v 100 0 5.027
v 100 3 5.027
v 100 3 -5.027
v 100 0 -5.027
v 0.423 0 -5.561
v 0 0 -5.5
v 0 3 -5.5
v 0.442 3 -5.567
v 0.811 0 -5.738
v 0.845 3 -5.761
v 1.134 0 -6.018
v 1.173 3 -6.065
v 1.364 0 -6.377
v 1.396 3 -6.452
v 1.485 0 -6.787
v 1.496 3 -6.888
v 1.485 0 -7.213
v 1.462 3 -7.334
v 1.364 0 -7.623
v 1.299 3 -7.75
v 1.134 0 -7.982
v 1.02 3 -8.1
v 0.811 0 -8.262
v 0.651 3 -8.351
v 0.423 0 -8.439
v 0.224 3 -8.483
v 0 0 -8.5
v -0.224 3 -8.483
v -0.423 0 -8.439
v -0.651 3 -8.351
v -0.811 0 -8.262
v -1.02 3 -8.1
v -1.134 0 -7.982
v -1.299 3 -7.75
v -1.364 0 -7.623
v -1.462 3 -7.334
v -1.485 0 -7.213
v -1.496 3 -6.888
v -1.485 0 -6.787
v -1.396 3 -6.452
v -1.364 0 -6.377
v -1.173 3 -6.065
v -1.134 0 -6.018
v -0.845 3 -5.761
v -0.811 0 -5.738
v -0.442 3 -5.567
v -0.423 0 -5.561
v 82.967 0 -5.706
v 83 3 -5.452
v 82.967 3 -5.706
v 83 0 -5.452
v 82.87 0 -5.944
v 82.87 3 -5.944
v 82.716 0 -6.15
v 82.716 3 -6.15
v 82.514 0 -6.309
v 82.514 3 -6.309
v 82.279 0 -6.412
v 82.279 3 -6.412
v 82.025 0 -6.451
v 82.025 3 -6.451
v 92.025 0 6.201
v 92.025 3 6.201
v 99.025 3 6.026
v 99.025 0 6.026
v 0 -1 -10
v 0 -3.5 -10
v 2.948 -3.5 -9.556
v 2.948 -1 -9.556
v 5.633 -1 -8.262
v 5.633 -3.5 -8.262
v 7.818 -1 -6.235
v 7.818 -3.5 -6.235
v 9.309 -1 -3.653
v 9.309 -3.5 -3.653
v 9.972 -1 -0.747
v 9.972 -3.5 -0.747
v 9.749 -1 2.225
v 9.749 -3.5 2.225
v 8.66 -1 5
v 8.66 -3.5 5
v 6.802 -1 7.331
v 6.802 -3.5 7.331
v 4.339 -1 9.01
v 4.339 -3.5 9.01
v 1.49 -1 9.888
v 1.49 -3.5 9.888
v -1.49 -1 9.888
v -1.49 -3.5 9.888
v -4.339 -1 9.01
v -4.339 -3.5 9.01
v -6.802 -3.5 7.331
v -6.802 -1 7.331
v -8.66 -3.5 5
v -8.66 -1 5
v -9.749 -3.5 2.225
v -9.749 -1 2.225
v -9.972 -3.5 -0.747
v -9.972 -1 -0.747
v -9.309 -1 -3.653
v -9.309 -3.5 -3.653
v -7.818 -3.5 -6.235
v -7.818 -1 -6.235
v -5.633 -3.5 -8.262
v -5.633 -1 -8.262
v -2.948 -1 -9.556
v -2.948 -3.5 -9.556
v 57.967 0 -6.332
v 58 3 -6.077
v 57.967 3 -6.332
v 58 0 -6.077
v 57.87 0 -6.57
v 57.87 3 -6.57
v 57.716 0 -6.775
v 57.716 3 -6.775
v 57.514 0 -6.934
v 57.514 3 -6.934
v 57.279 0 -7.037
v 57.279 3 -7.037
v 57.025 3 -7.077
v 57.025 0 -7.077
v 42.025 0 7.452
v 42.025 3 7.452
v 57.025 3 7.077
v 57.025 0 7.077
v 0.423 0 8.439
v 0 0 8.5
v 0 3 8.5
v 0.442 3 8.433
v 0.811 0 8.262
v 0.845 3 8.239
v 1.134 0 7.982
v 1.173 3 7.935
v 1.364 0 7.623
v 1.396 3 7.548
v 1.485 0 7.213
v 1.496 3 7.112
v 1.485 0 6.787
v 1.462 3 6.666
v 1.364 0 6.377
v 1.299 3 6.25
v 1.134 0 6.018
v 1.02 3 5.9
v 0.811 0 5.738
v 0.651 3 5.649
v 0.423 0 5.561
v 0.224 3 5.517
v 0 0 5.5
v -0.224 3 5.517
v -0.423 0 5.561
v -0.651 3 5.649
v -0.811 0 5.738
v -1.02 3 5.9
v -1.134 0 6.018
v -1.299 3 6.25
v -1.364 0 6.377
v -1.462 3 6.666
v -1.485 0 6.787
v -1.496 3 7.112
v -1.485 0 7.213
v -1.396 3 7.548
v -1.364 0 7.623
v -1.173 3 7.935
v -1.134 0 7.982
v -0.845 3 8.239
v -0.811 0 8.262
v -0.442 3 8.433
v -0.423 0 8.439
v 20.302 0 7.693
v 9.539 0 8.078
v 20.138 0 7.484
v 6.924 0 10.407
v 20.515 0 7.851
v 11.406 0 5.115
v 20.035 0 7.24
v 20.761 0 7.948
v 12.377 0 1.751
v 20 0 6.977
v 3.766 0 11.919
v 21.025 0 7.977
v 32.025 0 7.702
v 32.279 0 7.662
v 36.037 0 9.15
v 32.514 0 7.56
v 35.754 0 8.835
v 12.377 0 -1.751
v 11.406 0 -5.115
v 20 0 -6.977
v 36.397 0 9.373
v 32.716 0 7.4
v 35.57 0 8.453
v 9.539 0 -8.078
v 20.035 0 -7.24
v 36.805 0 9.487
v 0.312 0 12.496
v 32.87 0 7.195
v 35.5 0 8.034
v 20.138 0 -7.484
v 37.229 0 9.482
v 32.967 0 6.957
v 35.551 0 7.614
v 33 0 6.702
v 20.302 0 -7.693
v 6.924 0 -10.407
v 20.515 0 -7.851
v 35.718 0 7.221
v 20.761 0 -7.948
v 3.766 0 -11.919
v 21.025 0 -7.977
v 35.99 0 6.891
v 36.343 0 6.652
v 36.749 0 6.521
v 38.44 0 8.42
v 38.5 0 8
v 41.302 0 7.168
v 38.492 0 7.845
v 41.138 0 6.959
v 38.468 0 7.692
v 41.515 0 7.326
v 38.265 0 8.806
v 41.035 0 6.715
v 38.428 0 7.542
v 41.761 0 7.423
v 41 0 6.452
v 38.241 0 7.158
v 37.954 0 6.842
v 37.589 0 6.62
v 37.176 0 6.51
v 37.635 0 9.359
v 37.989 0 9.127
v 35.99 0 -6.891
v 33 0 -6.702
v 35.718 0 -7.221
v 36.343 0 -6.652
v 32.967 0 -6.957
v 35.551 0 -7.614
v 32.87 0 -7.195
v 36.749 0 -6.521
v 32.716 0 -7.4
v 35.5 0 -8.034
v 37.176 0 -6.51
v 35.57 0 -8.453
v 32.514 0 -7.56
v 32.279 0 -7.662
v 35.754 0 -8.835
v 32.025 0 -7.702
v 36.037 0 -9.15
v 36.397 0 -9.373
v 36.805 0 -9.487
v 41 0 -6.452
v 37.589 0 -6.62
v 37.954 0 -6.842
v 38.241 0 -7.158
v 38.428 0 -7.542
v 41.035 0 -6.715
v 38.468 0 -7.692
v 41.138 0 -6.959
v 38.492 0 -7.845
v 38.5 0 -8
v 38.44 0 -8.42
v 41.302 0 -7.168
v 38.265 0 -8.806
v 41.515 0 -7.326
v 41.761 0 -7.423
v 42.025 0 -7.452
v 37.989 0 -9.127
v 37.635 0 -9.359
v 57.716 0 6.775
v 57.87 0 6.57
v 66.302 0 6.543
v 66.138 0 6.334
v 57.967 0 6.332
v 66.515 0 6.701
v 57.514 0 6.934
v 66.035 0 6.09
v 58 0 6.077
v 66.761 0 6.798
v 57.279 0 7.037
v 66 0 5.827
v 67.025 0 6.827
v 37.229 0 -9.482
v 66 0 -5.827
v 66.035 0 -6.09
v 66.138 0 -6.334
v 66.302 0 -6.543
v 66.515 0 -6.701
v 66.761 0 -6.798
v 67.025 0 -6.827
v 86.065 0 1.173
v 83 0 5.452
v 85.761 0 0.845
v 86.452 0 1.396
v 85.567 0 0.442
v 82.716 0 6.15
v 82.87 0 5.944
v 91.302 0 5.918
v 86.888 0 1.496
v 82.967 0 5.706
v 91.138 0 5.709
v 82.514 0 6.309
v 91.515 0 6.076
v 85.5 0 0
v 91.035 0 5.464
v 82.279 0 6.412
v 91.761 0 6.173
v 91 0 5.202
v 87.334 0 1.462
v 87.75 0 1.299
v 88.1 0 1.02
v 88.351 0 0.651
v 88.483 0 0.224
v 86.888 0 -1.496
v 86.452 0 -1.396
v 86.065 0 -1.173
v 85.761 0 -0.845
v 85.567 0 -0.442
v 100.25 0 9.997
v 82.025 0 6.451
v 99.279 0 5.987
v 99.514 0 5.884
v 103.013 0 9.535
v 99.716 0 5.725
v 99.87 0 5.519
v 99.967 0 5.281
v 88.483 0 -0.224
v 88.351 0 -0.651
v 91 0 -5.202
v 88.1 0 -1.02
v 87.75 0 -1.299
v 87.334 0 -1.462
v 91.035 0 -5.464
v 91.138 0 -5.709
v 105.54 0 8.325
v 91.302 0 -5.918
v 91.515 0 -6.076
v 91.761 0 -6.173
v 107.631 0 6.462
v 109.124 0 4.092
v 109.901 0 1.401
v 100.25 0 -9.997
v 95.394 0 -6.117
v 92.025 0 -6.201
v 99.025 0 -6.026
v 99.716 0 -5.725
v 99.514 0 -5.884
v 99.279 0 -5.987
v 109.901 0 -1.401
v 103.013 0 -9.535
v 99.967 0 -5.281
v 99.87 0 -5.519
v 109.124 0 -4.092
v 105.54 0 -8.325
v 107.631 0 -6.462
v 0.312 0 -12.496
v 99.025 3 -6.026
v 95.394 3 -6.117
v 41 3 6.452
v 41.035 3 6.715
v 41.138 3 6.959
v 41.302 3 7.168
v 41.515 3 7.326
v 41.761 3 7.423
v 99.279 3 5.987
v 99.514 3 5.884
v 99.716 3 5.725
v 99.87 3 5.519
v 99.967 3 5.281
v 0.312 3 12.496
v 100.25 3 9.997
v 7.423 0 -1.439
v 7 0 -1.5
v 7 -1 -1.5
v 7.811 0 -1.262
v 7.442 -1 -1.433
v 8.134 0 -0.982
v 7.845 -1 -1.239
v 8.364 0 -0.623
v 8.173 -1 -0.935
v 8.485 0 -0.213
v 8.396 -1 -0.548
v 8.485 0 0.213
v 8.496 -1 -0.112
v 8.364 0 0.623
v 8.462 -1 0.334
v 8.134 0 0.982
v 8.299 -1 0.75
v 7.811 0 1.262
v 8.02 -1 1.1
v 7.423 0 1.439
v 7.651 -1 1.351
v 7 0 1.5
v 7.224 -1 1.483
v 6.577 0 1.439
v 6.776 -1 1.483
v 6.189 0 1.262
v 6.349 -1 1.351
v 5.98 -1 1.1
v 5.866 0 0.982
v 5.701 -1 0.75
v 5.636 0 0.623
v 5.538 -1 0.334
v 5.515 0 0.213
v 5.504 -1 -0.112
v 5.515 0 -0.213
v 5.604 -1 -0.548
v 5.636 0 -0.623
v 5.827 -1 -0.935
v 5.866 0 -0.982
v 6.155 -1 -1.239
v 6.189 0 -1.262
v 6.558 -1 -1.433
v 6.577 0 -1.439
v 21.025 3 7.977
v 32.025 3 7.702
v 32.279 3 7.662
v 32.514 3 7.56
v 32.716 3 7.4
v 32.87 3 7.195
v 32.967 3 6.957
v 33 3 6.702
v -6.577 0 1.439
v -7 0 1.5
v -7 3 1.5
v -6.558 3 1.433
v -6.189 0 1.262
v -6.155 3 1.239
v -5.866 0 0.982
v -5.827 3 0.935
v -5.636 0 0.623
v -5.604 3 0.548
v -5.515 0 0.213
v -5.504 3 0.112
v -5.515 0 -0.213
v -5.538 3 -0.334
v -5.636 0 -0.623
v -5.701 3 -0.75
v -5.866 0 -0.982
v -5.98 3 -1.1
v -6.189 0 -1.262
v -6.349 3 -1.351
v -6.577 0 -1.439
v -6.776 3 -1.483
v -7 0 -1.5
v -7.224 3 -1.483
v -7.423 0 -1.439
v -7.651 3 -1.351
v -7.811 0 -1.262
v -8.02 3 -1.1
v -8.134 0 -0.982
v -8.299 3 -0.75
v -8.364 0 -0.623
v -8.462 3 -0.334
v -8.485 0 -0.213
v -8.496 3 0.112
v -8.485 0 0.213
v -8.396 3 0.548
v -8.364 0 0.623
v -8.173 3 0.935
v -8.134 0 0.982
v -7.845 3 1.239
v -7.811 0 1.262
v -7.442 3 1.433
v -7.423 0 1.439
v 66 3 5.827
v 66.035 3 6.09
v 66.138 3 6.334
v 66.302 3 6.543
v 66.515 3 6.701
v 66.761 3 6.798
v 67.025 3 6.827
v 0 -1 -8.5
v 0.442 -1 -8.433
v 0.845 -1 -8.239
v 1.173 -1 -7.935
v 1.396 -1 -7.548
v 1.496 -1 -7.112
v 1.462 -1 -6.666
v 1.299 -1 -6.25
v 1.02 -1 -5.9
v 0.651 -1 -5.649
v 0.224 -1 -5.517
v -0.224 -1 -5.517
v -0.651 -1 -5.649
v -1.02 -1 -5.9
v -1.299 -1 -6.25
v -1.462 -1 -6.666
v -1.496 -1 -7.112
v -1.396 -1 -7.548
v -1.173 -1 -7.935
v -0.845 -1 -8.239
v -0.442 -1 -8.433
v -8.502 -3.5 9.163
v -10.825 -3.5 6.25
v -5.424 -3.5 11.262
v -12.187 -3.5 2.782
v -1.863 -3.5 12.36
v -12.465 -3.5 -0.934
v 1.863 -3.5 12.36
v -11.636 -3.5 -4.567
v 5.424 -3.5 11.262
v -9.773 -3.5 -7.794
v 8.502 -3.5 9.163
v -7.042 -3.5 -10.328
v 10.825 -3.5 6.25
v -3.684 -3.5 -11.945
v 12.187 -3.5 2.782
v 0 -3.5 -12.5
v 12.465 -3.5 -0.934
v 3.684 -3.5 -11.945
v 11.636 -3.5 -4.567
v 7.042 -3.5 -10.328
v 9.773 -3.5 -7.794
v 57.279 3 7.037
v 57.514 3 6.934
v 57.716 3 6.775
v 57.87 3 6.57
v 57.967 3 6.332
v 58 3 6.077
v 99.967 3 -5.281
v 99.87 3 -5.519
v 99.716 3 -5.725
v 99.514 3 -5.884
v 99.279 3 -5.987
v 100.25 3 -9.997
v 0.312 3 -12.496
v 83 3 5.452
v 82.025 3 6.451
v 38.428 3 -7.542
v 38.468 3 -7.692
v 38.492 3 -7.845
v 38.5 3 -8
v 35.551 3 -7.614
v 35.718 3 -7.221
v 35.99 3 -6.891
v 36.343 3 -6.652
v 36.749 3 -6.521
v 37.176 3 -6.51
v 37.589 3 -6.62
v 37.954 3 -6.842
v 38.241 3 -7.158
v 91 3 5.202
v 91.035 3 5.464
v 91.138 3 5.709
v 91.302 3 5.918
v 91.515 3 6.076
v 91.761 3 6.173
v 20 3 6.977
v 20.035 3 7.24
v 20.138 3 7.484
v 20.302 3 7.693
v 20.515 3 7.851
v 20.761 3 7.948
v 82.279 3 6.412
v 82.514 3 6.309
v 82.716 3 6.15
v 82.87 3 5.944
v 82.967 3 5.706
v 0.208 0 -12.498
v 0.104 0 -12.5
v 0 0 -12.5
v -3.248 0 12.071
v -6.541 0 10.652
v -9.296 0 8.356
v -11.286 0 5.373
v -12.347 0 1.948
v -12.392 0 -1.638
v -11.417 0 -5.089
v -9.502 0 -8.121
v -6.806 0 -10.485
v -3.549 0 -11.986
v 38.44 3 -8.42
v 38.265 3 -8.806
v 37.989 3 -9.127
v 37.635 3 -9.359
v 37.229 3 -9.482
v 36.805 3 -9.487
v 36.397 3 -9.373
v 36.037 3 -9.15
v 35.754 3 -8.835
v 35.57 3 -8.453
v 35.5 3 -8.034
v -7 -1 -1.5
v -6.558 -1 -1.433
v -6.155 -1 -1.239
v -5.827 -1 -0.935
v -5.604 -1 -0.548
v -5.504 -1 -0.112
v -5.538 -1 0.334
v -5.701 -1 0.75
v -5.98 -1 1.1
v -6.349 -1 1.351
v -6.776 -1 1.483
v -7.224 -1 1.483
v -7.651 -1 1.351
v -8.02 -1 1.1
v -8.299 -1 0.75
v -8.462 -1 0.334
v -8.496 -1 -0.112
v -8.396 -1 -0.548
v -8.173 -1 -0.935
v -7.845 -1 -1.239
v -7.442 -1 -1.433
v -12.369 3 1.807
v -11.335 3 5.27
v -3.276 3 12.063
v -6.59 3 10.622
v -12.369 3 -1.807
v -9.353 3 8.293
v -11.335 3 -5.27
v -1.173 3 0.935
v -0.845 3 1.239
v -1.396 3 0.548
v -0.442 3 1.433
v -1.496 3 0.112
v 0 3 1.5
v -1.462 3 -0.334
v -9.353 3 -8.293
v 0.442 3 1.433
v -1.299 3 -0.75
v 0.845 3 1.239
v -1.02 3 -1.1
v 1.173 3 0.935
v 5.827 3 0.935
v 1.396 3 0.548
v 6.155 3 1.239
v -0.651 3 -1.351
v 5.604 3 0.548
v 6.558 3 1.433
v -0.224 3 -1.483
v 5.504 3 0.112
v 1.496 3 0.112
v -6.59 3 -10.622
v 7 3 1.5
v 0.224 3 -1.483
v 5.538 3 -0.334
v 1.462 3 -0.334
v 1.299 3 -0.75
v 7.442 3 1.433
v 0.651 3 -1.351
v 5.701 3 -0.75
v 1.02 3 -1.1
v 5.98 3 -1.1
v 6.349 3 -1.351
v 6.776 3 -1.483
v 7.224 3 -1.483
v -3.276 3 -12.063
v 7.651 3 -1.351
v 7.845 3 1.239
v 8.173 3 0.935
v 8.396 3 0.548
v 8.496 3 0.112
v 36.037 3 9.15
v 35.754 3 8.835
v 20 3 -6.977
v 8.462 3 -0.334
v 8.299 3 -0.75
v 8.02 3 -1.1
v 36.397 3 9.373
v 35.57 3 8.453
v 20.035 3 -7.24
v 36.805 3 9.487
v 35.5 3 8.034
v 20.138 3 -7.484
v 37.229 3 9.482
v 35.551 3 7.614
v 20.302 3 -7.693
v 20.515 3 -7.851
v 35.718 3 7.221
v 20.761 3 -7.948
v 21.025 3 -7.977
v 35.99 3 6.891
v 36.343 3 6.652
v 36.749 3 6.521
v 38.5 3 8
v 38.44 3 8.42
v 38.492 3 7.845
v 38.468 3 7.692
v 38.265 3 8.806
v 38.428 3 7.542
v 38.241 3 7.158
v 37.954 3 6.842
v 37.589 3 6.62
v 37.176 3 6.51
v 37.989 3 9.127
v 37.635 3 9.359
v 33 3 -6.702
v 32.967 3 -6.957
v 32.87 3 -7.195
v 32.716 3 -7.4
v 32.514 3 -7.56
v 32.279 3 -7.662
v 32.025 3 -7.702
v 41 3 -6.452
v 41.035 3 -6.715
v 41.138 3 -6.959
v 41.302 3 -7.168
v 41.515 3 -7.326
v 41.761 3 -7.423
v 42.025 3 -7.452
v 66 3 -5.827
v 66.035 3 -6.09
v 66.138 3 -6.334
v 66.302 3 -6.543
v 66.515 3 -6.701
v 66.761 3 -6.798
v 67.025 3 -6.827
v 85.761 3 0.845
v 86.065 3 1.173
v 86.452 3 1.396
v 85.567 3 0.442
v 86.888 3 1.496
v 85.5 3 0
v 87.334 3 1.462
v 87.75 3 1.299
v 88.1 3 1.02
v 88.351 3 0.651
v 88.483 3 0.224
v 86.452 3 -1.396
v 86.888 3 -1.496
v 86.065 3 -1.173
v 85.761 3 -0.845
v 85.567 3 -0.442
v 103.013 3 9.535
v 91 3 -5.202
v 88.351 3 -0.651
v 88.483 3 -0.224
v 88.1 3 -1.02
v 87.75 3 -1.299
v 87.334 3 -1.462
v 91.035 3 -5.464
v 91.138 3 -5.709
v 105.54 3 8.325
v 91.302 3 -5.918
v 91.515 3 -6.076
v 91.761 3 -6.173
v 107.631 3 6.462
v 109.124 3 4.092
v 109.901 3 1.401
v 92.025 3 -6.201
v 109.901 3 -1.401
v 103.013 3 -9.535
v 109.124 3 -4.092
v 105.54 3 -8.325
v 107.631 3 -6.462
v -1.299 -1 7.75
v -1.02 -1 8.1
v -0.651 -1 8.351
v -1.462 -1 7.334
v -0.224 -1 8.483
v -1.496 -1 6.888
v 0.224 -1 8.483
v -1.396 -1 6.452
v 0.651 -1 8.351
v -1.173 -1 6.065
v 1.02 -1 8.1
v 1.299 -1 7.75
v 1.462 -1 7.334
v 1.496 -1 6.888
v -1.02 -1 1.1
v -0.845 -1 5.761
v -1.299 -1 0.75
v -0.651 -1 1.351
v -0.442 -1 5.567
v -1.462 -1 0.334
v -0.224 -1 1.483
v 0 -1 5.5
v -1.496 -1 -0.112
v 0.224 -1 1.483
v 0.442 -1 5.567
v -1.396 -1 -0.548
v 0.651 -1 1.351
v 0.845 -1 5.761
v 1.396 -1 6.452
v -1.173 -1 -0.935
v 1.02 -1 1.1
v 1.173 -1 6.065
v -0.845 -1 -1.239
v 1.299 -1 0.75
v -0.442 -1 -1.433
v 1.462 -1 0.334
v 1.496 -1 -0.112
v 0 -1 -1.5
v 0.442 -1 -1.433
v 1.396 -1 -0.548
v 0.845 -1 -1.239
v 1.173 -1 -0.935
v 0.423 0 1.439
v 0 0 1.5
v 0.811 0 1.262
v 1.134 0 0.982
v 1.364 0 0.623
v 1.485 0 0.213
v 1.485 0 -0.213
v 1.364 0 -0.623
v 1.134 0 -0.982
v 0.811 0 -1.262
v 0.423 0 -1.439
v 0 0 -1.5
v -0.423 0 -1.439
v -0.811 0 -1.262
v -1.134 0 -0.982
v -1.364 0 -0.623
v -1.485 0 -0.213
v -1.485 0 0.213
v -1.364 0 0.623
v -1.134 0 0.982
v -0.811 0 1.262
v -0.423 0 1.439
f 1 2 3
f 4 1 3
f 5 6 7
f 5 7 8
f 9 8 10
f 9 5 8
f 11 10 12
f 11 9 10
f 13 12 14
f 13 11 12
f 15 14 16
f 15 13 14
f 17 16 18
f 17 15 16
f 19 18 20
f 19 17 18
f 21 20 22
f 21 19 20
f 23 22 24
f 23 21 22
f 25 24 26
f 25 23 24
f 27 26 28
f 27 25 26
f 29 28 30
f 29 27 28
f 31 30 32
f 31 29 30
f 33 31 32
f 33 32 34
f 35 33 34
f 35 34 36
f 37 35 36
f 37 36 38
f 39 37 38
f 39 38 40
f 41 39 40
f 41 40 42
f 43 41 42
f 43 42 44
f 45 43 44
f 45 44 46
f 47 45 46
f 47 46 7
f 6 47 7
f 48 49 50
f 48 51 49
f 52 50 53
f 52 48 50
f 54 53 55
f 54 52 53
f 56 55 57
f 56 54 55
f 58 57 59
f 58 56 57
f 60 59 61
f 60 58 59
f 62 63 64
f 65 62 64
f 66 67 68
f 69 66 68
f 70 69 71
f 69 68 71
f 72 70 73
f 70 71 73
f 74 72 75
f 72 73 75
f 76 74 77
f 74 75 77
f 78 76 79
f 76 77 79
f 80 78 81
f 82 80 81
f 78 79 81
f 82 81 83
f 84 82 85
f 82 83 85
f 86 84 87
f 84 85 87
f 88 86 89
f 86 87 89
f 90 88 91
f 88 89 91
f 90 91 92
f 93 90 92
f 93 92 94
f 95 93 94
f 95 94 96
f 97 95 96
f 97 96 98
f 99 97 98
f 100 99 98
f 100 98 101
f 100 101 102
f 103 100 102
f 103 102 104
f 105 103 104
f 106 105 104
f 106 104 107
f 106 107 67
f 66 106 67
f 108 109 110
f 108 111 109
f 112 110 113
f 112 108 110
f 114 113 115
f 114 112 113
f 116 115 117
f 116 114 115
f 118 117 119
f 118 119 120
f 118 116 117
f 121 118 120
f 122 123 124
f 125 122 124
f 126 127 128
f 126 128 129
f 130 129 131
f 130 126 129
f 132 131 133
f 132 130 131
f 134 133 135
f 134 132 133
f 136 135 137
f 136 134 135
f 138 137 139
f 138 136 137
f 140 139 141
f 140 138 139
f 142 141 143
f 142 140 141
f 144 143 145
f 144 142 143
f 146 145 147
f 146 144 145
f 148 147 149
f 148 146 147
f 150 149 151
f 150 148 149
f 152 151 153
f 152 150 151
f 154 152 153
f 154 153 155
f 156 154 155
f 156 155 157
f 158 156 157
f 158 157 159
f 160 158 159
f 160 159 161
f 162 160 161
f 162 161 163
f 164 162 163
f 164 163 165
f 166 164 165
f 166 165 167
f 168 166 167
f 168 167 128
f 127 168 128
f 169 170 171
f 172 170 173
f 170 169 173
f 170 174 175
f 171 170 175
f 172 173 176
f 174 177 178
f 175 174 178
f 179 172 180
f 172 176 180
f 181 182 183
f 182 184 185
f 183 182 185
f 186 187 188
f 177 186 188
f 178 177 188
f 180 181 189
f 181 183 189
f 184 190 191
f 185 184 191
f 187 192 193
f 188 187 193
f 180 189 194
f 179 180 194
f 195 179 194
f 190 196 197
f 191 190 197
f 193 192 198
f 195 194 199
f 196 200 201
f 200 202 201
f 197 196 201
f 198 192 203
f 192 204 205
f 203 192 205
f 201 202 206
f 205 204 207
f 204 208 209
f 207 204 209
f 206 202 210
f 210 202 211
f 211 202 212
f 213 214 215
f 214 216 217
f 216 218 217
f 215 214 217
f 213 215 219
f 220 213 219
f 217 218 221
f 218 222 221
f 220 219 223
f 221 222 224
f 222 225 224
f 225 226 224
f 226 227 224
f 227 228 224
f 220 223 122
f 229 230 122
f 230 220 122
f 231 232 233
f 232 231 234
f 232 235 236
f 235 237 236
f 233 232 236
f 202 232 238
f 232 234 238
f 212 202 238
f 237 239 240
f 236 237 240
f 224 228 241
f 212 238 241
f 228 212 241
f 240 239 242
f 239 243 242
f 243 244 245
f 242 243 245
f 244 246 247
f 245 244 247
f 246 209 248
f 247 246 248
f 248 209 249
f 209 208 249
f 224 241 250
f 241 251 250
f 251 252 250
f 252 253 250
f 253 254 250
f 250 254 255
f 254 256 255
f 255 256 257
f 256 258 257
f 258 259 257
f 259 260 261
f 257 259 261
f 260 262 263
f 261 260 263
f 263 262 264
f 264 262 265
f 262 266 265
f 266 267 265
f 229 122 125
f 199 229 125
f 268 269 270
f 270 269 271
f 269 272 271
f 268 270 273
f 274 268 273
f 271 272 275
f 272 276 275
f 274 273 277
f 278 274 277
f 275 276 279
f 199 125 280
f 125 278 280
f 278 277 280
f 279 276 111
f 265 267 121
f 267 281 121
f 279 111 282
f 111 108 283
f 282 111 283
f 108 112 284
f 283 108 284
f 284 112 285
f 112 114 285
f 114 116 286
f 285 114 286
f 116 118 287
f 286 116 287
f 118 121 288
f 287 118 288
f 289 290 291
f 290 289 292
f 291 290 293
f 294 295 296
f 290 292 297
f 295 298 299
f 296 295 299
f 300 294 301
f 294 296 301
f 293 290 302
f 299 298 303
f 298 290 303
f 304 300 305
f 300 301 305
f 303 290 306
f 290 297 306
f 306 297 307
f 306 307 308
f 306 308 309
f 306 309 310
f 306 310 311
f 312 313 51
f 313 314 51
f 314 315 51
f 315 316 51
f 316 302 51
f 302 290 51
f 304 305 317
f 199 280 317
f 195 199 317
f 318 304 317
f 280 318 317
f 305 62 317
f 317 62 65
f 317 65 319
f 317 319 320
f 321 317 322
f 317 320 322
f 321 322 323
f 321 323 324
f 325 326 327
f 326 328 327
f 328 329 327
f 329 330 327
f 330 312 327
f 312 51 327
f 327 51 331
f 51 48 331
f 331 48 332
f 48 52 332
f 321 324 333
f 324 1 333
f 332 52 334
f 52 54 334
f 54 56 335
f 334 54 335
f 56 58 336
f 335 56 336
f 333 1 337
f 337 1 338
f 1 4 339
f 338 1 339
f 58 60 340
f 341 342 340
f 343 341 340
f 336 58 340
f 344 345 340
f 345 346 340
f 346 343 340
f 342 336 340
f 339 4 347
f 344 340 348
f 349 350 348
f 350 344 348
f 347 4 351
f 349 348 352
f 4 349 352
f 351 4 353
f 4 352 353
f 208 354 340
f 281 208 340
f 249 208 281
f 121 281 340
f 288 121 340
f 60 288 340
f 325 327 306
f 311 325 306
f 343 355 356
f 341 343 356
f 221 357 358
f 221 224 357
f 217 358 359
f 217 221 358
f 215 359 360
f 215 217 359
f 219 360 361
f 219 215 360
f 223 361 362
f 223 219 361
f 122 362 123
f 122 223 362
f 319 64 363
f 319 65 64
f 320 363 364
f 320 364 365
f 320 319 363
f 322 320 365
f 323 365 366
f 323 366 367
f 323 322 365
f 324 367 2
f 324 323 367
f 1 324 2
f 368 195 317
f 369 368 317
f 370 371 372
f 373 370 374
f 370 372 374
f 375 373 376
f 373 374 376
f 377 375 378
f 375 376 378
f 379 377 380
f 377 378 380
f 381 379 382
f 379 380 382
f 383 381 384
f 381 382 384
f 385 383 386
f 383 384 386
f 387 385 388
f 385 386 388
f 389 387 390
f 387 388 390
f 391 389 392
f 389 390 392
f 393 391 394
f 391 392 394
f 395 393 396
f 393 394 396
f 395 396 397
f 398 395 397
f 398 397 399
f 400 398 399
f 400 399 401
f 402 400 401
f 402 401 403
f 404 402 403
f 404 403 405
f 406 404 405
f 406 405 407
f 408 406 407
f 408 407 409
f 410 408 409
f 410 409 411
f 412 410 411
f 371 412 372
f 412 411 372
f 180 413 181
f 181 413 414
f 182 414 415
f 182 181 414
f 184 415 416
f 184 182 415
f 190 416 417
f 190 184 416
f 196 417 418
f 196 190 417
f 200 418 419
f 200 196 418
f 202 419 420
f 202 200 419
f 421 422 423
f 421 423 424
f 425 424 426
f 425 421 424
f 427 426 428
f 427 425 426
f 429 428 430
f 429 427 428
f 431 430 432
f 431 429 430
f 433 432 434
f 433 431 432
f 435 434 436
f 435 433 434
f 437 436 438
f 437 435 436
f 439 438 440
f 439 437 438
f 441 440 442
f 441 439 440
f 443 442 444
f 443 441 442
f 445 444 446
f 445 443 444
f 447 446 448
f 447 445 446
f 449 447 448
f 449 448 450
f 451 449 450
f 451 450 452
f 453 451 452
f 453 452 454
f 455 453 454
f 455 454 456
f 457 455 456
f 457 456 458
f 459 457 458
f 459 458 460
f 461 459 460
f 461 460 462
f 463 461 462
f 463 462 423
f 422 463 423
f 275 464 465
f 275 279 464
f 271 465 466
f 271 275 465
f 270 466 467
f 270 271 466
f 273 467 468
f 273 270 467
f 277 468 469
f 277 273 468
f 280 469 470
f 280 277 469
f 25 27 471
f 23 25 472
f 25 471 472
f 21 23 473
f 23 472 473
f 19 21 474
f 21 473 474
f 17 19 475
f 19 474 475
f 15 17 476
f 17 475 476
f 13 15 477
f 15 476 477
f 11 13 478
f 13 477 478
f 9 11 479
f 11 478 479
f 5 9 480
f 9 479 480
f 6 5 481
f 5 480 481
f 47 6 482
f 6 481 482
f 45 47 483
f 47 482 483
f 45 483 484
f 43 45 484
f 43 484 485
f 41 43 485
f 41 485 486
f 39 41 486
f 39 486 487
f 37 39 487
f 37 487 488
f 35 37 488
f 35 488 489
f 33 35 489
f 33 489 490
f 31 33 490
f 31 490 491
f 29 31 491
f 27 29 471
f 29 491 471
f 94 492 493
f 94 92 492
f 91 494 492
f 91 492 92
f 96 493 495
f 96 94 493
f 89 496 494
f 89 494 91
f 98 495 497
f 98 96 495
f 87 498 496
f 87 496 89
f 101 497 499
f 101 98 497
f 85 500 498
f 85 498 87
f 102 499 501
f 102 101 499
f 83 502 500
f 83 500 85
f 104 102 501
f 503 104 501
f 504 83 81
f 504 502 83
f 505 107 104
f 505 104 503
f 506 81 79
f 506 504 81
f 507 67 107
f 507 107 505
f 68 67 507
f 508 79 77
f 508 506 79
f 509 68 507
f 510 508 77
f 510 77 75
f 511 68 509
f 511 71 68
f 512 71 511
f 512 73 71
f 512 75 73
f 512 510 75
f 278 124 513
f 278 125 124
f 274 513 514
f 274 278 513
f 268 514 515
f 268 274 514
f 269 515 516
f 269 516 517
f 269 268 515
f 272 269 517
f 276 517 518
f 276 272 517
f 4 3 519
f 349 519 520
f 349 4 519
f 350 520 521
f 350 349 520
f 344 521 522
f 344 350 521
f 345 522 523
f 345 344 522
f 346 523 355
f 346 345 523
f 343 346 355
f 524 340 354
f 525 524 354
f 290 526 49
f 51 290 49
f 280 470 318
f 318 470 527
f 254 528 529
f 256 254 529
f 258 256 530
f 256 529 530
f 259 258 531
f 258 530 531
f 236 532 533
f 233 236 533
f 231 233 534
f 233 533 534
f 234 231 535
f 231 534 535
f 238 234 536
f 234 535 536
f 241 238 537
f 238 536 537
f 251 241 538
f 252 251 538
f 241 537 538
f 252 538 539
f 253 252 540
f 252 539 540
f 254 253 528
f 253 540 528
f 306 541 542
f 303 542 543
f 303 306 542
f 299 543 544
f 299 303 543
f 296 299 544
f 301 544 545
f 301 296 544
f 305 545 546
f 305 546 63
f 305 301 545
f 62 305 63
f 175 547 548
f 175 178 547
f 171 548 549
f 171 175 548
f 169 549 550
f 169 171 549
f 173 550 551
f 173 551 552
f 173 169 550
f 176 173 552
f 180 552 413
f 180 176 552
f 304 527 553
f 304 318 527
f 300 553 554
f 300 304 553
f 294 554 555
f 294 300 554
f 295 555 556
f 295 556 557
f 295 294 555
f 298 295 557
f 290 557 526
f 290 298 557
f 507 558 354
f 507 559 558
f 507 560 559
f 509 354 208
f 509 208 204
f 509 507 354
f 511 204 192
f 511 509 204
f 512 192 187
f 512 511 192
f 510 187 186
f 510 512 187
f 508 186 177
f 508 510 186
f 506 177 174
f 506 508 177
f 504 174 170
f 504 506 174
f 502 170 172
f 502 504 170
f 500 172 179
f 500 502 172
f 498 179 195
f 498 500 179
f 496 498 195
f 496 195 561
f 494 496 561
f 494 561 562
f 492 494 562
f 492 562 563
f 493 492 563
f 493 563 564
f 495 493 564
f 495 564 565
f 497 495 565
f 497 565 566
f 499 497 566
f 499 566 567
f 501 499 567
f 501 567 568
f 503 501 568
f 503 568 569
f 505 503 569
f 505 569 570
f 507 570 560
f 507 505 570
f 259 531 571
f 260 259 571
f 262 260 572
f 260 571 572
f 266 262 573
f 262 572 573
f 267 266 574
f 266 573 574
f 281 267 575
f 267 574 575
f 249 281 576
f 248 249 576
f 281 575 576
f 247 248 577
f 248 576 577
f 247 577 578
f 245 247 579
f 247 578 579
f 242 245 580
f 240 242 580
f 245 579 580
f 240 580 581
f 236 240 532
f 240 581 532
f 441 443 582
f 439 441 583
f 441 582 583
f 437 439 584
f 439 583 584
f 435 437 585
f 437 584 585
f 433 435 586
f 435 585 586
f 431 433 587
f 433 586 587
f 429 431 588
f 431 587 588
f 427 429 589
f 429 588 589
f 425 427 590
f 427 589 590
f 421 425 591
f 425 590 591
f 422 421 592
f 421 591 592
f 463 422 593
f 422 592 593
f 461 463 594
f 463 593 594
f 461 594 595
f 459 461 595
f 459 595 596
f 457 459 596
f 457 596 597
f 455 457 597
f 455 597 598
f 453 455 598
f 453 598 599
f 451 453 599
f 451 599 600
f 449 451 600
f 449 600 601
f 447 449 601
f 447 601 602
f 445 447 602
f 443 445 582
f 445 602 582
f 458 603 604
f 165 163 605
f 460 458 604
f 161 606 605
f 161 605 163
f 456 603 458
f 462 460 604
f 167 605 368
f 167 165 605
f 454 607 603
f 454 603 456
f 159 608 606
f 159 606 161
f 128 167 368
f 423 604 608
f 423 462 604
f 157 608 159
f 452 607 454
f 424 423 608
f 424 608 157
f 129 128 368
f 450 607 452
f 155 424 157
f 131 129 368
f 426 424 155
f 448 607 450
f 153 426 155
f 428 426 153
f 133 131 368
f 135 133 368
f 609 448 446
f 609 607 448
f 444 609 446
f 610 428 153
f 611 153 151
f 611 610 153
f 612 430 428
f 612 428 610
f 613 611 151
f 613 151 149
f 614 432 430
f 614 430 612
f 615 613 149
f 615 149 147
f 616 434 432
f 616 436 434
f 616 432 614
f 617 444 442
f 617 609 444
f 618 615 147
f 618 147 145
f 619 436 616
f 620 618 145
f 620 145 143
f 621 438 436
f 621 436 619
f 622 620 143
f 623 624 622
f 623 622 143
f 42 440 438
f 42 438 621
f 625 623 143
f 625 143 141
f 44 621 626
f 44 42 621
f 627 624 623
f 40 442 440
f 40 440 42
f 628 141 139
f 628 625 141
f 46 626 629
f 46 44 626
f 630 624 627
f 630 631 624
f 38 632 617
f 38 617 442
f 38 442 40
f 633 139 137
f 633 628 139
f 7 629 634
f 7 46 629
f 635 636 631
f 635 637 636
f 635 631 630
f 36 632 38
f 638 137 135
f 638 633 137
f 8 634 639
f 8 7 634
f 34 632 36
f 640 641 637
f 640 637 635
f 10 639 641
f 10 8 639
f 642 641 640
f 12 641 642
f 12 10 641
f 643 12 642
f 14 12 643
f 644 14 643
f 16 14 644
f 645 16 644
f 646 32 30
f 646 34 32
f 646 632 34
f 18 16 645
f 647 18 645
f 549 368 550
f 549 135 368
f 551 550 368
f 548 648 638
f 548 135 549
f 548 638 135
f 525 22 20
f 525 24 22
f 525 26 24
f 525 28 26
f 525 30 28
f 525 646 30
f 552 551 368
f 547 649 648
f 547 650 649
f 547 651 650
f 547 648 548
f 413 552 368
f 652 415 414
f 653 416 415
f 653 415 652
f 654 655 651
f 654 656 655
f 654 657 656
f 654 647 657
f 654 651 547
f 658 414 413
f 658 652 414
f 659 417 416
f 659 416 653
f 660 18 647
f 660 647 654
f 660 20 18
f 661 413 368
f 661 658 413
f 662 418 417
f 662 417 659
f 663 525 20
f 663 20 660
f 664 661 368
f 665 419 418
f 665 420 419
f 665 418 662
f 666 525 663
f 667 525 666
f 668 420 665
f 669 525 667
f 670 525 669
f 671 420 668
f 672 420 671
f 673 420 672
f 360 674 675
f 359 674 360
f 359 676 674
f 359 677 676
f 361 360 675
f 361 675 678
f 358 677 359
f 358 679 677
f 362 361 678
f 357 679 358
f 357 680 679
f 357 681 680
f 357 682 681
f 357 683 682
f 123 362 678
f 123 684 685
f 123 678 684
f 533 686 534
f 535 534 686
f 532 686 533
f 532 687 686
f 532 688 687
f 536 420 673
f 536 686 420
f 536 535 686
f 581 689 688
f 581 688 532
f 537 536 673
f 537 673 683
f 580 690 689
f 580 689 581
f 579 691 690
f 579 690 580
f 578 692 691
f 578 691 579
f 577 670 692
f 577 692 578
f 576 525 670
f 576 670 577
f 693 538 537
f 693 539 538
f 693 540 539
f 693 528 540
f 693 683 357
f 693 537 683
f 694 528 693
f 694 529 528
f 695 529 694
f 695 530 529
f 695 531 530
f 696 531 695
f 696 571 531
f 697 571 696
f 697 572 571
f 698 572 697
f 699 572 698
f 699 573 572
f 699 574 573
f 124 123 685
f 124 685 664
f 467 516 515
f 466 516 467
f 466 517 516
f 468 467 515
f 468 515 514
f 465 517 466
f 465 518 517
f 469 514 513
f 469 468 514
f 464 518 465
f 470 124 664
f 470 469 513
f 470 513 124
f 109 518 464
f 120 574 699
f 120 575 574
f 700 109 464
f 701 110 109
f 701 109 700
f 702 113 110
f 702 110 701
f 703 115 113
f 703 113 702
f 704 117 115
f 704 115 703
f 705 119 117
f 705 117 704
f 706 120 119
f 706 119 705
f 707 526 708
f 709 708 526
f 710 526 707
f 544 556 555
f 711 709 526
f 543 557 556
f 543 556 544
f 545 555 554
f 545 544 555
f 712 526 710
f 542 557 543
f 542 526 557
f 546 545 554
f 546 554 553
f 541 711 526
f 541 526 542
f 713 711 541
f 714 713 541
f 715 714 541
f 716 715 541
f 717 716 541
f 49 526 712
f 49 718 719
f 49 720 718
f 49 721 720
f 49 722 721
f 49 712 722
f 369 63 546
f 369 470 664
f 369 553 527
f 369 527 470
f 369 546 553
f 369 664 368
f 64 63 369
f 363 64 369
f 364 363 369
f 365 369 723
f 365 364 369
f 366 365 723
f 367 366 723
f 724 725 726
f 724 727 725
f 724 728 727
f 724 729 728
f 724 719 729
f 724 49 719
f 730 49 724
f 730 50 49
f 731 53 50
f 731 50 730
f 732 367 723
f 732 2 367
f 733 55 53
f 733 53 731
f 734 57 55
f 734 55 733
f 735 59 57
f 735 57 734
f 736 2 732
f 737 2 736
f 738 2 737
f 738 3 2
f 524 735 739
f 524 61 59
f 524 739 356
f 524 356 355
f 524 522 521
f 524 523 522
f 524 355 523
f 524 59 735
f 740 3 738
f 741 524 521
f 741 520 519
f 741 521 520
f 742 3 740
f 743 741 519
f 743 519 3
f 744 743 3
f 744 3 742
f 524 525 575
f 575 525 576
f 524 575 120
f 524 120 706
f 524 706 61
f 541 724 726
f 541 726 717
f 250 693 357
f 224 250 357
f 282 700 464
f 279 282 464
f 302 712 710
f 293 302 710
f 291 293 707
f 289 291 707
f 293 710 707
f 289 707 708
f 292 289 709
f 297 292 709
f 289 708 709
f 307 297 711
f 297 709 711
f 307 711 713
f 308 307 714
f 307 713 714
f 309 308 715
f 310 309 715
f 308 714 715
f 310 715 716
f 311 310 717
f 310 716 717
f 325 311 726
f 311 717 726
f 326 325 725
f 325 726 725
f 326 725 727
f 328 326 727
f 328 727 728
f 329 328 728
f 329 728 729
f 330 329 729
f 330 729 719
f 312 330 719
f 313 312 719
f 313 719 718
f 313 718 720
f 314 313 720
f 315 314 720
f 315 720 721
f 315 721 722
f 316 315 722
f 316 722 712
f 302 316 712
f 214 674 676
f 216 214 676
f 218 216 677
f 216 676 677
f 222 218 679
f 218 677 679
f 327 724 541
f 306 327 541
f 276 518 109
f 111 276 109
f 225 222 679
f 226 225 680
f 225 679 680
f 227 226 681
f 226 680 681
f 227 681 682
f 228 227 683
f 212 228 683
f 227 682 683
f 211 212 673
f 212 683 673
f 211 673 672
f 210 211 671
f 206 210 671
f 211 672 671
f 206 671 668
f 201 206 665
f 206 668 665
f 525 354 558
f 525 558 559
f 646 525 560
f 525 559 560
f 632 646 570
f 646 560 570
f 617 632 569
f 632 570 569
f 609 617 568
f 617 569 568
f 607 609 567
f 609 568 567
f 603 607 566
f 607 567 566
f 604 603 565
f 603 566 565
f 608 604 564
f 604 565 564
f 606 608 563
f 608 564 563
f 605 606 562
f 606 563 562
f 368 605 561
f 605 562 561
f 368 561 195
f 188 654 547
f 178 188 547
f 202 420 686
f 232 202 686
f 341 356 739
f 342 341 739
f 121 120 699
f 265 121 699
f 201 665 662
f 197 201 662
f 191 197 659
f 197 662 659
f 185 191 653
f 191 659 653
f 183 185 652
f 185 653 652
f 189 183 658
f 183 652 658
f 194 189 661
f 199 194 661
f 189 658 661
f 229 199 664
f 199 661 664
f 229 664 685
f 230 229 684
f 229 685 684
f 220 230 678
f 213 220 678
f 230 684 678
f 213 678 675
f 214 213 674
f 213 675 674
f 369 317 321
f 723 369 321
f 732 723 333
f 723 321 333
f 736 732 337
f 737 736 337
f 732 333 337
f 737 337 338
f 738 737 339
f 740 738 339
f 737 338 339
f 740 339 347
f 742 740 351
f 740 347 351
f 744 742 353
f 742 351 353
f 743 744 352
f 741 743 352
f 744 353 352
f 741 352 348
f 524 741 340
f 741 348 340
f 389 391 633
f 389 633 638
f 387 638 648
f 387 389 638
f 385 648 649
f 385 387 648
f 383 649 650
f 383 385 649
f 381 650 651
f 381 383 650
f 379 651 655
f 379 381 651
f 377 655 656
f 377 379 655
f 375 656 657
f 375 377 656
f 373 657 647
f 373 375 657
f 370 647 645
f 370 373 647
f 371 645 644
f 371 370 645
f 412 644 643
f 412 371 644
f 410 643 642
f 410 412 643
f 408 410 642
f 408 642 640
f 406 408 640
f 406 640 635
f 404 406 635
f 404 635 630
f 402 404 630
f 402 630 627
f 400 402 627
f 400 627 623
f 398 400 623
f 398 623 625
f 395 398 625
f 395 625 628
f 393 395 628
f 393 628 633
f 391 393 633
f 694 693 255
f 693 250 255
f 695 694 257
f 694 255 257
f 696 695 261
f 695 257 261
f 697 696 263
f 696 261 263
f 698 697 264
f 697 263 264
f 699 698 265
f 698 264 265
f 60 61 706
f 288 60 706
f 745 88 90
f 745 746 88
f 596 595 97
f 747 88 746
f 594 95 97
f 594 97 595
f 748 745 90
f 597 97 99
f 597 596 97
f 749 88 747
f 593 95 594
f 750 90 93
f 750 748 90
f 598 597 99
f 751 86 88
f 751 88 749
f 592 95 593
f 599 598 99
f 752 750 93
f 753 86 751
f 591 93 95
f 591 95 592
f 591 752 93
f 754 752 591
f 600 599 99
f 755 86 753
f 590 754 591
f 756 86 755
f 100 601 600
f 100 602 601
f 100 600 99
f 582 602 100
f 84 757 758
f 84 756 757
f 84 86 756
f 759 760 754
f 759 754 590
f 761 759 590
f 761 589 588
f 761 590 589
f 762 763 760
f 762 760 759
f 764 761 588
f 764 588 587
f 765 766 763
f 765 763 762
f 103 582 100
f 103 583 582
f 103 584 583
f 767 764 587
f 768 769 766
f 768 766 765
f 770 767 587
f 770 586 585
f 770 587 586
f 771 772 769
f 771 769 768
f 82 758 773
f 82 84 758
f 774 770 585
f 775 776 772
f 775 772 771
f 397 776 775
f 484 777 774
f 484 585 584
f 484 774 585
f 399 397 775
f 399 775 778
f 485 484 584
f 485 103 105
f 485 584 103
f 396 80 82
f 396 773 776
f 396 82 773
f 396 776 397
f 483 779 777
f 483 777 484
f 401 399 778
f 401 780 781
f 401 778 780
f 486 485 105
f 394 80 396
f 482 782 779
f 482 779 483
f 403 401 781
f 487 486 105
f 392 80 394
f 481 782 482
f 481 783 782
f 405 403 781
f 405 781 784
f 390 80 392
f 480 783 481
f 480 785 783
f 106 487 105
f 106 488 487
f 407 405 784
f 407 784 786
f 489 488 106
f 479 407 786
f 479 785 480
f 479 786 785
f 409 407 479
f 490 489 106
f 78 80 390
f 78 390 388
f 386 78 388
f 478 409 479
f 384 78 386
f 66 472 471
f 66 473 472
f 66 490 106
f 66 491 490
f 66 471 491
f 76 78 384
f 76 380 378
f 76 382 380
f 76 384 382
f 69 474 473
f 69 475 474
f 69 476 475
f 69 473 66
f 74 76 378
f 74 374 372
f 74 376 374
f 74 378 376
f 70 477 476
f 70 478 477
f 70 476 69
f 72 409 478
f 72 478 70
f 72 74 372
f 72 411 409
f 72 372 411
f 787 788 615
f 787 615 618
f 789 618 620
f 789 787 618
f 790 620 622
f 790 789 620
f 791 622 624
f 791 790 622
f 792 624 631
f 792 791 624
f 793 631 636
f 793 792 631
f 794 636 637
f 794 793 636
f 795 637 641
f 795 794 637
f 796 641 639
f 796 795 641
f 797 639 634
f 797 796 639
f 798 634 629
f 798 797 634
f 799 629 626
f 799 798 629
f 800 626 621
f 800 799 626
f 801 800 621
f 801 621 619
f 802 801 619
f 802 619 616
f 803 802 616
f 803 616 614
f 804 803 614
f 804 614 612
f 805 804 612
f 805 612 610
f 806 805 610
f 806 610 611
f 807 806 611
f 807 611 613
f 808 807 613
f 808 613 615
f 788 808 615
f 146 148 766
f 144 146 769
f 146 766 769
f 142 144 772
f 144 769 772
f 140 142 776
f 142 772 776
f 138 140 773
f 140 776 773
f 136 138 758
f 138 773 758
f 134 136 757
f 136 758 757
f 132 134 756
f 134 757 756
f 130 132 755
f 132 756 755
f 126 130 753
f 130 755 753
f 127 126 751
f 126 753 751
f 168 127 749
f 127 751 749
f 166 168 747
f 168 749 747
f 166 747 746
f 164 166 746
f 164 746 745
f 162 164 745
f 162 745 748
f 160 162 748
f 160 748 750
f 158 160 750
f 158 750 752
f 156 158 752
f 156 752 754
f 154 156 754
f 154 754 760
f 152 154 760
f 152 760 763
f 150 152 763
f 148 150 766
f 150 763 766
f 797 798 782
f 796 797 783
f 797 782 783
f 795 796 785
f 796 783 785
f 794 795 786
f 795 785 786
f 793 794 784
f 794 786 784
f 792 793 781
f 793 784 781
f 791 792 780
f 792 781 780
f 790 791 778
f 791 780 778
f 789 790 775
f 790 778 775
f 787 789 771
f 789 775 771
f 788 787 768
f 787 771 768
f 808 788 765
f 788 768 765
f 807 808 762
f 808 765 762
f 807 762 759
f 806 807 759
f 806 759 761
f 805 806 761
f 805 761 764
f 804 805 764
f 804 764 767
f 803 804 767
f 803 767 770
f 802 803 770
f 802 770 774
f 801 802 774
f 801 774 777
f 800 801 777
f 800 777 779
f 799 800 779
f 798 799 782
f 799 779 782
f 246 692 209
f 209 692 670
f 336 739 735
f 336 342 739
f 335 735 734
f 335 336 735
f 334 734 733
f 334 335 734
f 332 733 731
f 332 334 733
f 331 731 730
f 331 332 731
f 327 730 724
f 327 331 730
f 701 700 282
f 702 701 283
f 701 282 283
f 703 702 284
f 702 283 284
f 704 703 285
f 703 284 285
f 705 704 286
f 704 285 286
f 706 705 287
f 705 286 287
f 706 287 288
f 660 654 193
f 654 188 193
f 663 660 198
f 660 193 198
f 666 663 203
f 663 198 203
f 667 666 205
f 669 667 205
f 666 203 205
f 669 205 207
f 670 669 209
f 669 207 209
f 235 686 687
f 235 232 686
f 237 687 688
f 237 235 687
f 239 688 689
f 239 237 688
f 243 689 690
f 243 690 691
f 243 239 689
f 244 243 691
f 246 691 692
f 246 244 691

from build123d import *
from build123d.topology import SkipClean

# Parameters (mm, degrees)
SKETCH_1_R          = 1.5
EXTRUDE_1_DEPTH     = 3
EXTRUDE_START       = 3.5
SKETCH_2_R          = 12.5
SKETCH_2_R_2        = 10
EXTRUDE_2_DEPTH     = 3.5
CUT_EXTRUDE_1_DEPTH = 10
FILLET_1_R          = 1
EXTRUDE_START_2     = 1
SKETCH_5_R          = 10
SKETCH_5_R_2        = 1.5
EXTRUDE_3_DEPTH     = 1


with BuildPart() as part:
    # 草图1 → 凸台-拉伸1 (new body)
    with BuildSketch(Plane(origin=(0, 0, 0), x_dir=(1, 0, 0), z_dir=(0, 1, 0))):
        with BuildLine():
            Line((100.25, 9.996874512), (0.3125, 12.496093139))
            ThreePointArc((0.3125, 12.496093139), (-12.5, 0), (0.3125, -12.496093139))
            Line((0.3125, -12.496093139), (100.25, -9.996874512))
            ThreePointArc((100.25, -9.996874512), (110, 0), (100.25, 9.996874512))
        make_face()
        with Locations(Location((7, 0, 0), (0, 0, 270))):
            Circle(SKETCH_1_R, mode=Mode.SUBTRACT)
        with Locations(Location((0, 0, 0), (0, 0, 270))):
            Circle(SKETCH_1_R, mode=Mode.SUBTRACT)
        with Locations(Location((-7, 0, 0), (0, 0, 270))):
            Circle(SKETCH_1_R, mode=Mode.SUBTRACT)
        with Locations(Location((0, 7, 0), (0, 0, 270))):
            Circle(SKETCH_1_R, mode=Mode.SUBTRACT)
        with Locations(Location((0, -7, 0), (0, 0, 270))):
            Circle(SKETCH_1_R, mode=Mode.SUBTRACT)
    extrude(amount=EXTRUDE_1_DEPTH)

    # 草图2 → 凸台-拉伸2 (add)
    with BuildSketch(Plane.XZ.offset(EXTRUDE_START)):
        with Locations(Location((0, 0, 0), (0, 0, 270))):
            Circle(SKETCH_2_R)
        with Locations(Location((0, 0, 0), (0, 0, 270))):
            Circle(SKETCH_2_R_2, mode=Mode.SUBTRACT)
    extrude(amount=-EXTRUDE_2_DEPTH)

    # 草图3 → 切除-拉伸1 (cut)
    with BuildSketch(Plane(origin=(0, 3, 0), x_dir=(1, 0, 0), z_dir=(0, 1, 0))):
        Polygon((20, 8.002501172), (20, 0), (33, 0), (33, 7.677399562), align=None)
        Polygon((33, 0), (20, 0), (20, -8.002501172), (33, -7.677399562), align=None)
        with BuildLine():
            ThreePointArc((38.5, 8), (36.805156295, 9.487291475), (35.550618759, 7.613614157))
            Line((35.550618759, 7.613614157), (38.42825626, 7.541650728))
            ThreePointArc((38.42825626, 7.541650728), (38.481955531, 7.768034906), (38.5, 8))
        make_face()
        with BuildLine():
            Line((38.42825626, 7.541650728), (35.550618759, 7.613614157))
            ThreePointArc((35.550618759, 7.613614157), (36.9625, 6.500468823), (38.42825626, 7.541650728))
        make_face()
        with BuildLine():
            ThreePointArc((38.42825626, -7.541650728), (36.9625, -6.500468823), (35.550618759, -7.613614157))
            Line((35.550618759, -7.613614157), (38.42825626, -7.541650728))
        make_face()
        with BuildLine():
            Line((38.42825626, -7.541650728), (35.550618759, -7.613614157))
            ThreePointArc((35.550618759, -7.613614157), (36.805156295, -9.487291475), (38.5, -8))
            ThreePointArc((38.5, -8), (38.481955531, -7.768034906), (38.42825626, -7.541650728))
        make_face()
        Polygon((41, 7.477337033), (41, 0), (58, 0), (58, 7.052204158), align=None)
        Polygon((58, 0), (41, 0), (41, -7.477337033), (58, -7.052204158), align=None)
        Polygon((66, 6.852141629), (66, 0), (83, 0), (83, 6.427008754), align=None)
        Polygon((83, 0), (66, 0), (66, -6.852141629), (83, -6.427008754), align=None)
        with BuildLine():
            ThreePointArc((88.5, 0), (87, 1.5), (85.5, 0))
            Line((85.5, 0), (88.5, 0))
        make_face()
        with BuildLine():
            Line((88.5, 0), (85.5, 0))
            ThreePointArc((85.5, 0), (87, -1.5), (88.5, 0))
        make_face()
        Polygon((95.393745853, 6.117068236), (91, 6.226946225), (91, 0), (100, 0), (100, 6.001875879), align=None)
        Polygon((91, 0), (91, -6.226946225), (100, -6.001875879), (100, 0), align=None)
    extrude(amount=-CUT_EXTRUDE_1_DEPTH, mode=Mode.SUBTRACT)

    # 圆角1
    fillet_1_edges = [part.edges().sort_by_distance(p)[0] for p in [
        (91, 1.5, 6.226946225),
        (91, 1.5, -6.226946225),
        (100, 1.5, -6.001875879),
        (100, 1.5, 6.001875879),
        (20, 1.5, 8.002501172),
        (20, 1.5, -8.002501172),
        (33, 1.5, -7.677399562),
        (33, 1.5, 7.677399562),
        (41, 1.5, 7.477337033),
        (41, 1.5, -7.477337033),
        (58, 1.5, -7.052204158),
        (58, 1.5, 7.052204158),
        (66, 1.5, 6.852141629),
        (66, 1.5, -6.852141629),
        (83, 1.5, -6.427008754),
        (83, 1.5, 6.427008754),
    ]]
    fillet(fillet_1_edges, radius=FILLET_1_R)

    # 草图5 → 凸台-拉伸3 (add)
    with SkipClean():  # the faces are left unmerged after this step: merging them gives an invalid solid
        with BuildSketch(Plane.XZ.offset(EXTRUDE_START_2)):
            with Locations(Location((0, 0, 0), (0, 0, 270))):
                Circle(SKETCH_5_R)
            with Locations(Location((0, 0, 0), (0, 0, 270))):
                Circle(SKETCH_5_R_2, mode=Mode.SUBTRACT)
            with Locations(Location((7, 0, 0), (0, 0, 270))):
                Circle(SKETCH_5_R_2, mode=Mode.SUBTRACT)
            with Locations(Location((-7, 0, 0), (0, 0, 270))):
                Circle(SKETCH_5_R_2, mode=Mode.SUBTRACT)
            with Locations(Location((0, -7, 0), (0, 0, 270))):
                Circle(SKETCH_5_R_2, mode=Mode.SUBTRACT)
            with Locations(Location((0, 7, 0), (0, 0, 270))):
                Circle(SKETCH_5_R_2, mode=Mode.SUBTRACT)
        extrude(amount=-EXTRUDE_3_DEPTH)


solid = part.part
